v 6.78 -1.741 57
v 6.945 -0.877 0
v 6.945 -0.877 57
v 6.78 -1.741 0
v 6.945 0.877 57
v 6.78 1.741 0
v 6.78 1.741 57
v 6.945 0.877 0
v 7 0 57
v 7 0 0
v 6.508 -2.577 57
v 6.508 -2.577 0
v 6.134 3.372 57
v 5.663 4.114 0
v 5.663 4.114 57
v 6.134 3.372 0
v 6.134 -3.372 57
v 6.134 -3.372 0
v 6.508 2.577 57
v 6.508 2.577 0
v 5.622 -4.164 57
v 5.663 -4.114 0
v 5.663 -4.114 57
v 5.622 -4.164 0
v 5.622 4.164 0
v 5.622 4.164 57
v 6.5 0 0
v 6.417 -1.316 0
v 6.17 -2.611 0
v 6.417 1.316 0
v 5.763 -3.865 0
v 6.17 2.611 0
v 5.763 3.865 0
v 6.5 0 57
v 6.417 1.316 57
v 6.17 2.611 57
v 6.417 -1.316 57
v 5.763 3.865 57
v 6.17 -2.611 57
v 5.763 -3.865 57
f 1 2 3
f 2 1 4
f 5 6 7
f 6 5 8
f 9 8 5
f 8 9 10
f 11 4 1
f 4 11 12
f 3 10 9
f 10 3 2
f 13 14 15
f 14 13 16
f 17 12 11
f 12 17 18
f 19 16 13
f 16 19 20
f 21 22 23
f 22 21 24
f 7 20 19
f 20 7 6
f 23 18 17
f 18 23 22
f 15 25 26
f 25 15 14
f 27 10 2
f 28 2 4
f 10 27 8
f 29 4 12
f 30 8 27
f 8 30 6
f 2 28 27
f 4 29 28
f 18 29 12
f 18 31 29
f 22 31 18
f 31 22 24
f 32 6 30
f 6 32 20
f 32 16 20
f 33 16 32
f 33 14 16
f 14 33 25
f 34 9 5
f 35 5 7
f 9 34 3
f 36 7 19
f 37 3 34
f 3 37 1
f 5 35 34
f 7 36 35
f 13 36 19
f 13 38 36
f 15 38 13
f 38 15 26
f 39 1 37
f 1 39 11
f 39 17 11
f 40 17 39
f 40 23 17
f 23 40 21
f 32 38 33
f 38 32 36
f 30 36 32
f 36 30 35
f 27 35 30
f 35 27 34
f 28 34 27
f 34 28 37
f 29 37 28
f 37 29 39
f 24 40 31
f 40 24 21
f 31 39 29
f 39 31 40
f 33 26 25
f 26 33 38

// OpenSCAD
$fn = 50;


difference() {
	union() {
		cylinder(h = 57, r = 7.0000000000);
		translate(v = [-7.0000000000, 0, 0]) {
			cylinder(h = 57, r = 7.0000000000);
		}
	}
	union() {
		cylinder(h = 57, r = 3.2500000000);
		cylinder(h = 57, r = 1.8000000000);
		cylinder(h = 57, r = 1.8000000000);
		cylinder(h = 57, r = 1.8000000000);
		translate(v = [-11.5000000000, 0, 0]) {
			hull() {
				translate(v = [-3.7500000000, 0.0000000000, 0]) {
					cylinder(h = 57, r = 7.5000000000);
				}
				translate(v = [3.7500000000, 0.0000000000, 0]) {
					cylinder(h = 57, r = 7.5000000000);
				}
				translate(v = [-3.7500000000, -0.0000000000, 0]) {
					cylinder(h = 57, r = 7.5000000000);
				}
				translate(v = [3.7500000000, -0.0000000000, 0]) {
					cylinder(h = 57, r = 7.5000000000);
				}
			}
		}
		translate(v = [-4.0000000000, 0, 0.0000000000]) {
			cylinder(h = 57, r = 10.5000000000);
		}
	}
}
